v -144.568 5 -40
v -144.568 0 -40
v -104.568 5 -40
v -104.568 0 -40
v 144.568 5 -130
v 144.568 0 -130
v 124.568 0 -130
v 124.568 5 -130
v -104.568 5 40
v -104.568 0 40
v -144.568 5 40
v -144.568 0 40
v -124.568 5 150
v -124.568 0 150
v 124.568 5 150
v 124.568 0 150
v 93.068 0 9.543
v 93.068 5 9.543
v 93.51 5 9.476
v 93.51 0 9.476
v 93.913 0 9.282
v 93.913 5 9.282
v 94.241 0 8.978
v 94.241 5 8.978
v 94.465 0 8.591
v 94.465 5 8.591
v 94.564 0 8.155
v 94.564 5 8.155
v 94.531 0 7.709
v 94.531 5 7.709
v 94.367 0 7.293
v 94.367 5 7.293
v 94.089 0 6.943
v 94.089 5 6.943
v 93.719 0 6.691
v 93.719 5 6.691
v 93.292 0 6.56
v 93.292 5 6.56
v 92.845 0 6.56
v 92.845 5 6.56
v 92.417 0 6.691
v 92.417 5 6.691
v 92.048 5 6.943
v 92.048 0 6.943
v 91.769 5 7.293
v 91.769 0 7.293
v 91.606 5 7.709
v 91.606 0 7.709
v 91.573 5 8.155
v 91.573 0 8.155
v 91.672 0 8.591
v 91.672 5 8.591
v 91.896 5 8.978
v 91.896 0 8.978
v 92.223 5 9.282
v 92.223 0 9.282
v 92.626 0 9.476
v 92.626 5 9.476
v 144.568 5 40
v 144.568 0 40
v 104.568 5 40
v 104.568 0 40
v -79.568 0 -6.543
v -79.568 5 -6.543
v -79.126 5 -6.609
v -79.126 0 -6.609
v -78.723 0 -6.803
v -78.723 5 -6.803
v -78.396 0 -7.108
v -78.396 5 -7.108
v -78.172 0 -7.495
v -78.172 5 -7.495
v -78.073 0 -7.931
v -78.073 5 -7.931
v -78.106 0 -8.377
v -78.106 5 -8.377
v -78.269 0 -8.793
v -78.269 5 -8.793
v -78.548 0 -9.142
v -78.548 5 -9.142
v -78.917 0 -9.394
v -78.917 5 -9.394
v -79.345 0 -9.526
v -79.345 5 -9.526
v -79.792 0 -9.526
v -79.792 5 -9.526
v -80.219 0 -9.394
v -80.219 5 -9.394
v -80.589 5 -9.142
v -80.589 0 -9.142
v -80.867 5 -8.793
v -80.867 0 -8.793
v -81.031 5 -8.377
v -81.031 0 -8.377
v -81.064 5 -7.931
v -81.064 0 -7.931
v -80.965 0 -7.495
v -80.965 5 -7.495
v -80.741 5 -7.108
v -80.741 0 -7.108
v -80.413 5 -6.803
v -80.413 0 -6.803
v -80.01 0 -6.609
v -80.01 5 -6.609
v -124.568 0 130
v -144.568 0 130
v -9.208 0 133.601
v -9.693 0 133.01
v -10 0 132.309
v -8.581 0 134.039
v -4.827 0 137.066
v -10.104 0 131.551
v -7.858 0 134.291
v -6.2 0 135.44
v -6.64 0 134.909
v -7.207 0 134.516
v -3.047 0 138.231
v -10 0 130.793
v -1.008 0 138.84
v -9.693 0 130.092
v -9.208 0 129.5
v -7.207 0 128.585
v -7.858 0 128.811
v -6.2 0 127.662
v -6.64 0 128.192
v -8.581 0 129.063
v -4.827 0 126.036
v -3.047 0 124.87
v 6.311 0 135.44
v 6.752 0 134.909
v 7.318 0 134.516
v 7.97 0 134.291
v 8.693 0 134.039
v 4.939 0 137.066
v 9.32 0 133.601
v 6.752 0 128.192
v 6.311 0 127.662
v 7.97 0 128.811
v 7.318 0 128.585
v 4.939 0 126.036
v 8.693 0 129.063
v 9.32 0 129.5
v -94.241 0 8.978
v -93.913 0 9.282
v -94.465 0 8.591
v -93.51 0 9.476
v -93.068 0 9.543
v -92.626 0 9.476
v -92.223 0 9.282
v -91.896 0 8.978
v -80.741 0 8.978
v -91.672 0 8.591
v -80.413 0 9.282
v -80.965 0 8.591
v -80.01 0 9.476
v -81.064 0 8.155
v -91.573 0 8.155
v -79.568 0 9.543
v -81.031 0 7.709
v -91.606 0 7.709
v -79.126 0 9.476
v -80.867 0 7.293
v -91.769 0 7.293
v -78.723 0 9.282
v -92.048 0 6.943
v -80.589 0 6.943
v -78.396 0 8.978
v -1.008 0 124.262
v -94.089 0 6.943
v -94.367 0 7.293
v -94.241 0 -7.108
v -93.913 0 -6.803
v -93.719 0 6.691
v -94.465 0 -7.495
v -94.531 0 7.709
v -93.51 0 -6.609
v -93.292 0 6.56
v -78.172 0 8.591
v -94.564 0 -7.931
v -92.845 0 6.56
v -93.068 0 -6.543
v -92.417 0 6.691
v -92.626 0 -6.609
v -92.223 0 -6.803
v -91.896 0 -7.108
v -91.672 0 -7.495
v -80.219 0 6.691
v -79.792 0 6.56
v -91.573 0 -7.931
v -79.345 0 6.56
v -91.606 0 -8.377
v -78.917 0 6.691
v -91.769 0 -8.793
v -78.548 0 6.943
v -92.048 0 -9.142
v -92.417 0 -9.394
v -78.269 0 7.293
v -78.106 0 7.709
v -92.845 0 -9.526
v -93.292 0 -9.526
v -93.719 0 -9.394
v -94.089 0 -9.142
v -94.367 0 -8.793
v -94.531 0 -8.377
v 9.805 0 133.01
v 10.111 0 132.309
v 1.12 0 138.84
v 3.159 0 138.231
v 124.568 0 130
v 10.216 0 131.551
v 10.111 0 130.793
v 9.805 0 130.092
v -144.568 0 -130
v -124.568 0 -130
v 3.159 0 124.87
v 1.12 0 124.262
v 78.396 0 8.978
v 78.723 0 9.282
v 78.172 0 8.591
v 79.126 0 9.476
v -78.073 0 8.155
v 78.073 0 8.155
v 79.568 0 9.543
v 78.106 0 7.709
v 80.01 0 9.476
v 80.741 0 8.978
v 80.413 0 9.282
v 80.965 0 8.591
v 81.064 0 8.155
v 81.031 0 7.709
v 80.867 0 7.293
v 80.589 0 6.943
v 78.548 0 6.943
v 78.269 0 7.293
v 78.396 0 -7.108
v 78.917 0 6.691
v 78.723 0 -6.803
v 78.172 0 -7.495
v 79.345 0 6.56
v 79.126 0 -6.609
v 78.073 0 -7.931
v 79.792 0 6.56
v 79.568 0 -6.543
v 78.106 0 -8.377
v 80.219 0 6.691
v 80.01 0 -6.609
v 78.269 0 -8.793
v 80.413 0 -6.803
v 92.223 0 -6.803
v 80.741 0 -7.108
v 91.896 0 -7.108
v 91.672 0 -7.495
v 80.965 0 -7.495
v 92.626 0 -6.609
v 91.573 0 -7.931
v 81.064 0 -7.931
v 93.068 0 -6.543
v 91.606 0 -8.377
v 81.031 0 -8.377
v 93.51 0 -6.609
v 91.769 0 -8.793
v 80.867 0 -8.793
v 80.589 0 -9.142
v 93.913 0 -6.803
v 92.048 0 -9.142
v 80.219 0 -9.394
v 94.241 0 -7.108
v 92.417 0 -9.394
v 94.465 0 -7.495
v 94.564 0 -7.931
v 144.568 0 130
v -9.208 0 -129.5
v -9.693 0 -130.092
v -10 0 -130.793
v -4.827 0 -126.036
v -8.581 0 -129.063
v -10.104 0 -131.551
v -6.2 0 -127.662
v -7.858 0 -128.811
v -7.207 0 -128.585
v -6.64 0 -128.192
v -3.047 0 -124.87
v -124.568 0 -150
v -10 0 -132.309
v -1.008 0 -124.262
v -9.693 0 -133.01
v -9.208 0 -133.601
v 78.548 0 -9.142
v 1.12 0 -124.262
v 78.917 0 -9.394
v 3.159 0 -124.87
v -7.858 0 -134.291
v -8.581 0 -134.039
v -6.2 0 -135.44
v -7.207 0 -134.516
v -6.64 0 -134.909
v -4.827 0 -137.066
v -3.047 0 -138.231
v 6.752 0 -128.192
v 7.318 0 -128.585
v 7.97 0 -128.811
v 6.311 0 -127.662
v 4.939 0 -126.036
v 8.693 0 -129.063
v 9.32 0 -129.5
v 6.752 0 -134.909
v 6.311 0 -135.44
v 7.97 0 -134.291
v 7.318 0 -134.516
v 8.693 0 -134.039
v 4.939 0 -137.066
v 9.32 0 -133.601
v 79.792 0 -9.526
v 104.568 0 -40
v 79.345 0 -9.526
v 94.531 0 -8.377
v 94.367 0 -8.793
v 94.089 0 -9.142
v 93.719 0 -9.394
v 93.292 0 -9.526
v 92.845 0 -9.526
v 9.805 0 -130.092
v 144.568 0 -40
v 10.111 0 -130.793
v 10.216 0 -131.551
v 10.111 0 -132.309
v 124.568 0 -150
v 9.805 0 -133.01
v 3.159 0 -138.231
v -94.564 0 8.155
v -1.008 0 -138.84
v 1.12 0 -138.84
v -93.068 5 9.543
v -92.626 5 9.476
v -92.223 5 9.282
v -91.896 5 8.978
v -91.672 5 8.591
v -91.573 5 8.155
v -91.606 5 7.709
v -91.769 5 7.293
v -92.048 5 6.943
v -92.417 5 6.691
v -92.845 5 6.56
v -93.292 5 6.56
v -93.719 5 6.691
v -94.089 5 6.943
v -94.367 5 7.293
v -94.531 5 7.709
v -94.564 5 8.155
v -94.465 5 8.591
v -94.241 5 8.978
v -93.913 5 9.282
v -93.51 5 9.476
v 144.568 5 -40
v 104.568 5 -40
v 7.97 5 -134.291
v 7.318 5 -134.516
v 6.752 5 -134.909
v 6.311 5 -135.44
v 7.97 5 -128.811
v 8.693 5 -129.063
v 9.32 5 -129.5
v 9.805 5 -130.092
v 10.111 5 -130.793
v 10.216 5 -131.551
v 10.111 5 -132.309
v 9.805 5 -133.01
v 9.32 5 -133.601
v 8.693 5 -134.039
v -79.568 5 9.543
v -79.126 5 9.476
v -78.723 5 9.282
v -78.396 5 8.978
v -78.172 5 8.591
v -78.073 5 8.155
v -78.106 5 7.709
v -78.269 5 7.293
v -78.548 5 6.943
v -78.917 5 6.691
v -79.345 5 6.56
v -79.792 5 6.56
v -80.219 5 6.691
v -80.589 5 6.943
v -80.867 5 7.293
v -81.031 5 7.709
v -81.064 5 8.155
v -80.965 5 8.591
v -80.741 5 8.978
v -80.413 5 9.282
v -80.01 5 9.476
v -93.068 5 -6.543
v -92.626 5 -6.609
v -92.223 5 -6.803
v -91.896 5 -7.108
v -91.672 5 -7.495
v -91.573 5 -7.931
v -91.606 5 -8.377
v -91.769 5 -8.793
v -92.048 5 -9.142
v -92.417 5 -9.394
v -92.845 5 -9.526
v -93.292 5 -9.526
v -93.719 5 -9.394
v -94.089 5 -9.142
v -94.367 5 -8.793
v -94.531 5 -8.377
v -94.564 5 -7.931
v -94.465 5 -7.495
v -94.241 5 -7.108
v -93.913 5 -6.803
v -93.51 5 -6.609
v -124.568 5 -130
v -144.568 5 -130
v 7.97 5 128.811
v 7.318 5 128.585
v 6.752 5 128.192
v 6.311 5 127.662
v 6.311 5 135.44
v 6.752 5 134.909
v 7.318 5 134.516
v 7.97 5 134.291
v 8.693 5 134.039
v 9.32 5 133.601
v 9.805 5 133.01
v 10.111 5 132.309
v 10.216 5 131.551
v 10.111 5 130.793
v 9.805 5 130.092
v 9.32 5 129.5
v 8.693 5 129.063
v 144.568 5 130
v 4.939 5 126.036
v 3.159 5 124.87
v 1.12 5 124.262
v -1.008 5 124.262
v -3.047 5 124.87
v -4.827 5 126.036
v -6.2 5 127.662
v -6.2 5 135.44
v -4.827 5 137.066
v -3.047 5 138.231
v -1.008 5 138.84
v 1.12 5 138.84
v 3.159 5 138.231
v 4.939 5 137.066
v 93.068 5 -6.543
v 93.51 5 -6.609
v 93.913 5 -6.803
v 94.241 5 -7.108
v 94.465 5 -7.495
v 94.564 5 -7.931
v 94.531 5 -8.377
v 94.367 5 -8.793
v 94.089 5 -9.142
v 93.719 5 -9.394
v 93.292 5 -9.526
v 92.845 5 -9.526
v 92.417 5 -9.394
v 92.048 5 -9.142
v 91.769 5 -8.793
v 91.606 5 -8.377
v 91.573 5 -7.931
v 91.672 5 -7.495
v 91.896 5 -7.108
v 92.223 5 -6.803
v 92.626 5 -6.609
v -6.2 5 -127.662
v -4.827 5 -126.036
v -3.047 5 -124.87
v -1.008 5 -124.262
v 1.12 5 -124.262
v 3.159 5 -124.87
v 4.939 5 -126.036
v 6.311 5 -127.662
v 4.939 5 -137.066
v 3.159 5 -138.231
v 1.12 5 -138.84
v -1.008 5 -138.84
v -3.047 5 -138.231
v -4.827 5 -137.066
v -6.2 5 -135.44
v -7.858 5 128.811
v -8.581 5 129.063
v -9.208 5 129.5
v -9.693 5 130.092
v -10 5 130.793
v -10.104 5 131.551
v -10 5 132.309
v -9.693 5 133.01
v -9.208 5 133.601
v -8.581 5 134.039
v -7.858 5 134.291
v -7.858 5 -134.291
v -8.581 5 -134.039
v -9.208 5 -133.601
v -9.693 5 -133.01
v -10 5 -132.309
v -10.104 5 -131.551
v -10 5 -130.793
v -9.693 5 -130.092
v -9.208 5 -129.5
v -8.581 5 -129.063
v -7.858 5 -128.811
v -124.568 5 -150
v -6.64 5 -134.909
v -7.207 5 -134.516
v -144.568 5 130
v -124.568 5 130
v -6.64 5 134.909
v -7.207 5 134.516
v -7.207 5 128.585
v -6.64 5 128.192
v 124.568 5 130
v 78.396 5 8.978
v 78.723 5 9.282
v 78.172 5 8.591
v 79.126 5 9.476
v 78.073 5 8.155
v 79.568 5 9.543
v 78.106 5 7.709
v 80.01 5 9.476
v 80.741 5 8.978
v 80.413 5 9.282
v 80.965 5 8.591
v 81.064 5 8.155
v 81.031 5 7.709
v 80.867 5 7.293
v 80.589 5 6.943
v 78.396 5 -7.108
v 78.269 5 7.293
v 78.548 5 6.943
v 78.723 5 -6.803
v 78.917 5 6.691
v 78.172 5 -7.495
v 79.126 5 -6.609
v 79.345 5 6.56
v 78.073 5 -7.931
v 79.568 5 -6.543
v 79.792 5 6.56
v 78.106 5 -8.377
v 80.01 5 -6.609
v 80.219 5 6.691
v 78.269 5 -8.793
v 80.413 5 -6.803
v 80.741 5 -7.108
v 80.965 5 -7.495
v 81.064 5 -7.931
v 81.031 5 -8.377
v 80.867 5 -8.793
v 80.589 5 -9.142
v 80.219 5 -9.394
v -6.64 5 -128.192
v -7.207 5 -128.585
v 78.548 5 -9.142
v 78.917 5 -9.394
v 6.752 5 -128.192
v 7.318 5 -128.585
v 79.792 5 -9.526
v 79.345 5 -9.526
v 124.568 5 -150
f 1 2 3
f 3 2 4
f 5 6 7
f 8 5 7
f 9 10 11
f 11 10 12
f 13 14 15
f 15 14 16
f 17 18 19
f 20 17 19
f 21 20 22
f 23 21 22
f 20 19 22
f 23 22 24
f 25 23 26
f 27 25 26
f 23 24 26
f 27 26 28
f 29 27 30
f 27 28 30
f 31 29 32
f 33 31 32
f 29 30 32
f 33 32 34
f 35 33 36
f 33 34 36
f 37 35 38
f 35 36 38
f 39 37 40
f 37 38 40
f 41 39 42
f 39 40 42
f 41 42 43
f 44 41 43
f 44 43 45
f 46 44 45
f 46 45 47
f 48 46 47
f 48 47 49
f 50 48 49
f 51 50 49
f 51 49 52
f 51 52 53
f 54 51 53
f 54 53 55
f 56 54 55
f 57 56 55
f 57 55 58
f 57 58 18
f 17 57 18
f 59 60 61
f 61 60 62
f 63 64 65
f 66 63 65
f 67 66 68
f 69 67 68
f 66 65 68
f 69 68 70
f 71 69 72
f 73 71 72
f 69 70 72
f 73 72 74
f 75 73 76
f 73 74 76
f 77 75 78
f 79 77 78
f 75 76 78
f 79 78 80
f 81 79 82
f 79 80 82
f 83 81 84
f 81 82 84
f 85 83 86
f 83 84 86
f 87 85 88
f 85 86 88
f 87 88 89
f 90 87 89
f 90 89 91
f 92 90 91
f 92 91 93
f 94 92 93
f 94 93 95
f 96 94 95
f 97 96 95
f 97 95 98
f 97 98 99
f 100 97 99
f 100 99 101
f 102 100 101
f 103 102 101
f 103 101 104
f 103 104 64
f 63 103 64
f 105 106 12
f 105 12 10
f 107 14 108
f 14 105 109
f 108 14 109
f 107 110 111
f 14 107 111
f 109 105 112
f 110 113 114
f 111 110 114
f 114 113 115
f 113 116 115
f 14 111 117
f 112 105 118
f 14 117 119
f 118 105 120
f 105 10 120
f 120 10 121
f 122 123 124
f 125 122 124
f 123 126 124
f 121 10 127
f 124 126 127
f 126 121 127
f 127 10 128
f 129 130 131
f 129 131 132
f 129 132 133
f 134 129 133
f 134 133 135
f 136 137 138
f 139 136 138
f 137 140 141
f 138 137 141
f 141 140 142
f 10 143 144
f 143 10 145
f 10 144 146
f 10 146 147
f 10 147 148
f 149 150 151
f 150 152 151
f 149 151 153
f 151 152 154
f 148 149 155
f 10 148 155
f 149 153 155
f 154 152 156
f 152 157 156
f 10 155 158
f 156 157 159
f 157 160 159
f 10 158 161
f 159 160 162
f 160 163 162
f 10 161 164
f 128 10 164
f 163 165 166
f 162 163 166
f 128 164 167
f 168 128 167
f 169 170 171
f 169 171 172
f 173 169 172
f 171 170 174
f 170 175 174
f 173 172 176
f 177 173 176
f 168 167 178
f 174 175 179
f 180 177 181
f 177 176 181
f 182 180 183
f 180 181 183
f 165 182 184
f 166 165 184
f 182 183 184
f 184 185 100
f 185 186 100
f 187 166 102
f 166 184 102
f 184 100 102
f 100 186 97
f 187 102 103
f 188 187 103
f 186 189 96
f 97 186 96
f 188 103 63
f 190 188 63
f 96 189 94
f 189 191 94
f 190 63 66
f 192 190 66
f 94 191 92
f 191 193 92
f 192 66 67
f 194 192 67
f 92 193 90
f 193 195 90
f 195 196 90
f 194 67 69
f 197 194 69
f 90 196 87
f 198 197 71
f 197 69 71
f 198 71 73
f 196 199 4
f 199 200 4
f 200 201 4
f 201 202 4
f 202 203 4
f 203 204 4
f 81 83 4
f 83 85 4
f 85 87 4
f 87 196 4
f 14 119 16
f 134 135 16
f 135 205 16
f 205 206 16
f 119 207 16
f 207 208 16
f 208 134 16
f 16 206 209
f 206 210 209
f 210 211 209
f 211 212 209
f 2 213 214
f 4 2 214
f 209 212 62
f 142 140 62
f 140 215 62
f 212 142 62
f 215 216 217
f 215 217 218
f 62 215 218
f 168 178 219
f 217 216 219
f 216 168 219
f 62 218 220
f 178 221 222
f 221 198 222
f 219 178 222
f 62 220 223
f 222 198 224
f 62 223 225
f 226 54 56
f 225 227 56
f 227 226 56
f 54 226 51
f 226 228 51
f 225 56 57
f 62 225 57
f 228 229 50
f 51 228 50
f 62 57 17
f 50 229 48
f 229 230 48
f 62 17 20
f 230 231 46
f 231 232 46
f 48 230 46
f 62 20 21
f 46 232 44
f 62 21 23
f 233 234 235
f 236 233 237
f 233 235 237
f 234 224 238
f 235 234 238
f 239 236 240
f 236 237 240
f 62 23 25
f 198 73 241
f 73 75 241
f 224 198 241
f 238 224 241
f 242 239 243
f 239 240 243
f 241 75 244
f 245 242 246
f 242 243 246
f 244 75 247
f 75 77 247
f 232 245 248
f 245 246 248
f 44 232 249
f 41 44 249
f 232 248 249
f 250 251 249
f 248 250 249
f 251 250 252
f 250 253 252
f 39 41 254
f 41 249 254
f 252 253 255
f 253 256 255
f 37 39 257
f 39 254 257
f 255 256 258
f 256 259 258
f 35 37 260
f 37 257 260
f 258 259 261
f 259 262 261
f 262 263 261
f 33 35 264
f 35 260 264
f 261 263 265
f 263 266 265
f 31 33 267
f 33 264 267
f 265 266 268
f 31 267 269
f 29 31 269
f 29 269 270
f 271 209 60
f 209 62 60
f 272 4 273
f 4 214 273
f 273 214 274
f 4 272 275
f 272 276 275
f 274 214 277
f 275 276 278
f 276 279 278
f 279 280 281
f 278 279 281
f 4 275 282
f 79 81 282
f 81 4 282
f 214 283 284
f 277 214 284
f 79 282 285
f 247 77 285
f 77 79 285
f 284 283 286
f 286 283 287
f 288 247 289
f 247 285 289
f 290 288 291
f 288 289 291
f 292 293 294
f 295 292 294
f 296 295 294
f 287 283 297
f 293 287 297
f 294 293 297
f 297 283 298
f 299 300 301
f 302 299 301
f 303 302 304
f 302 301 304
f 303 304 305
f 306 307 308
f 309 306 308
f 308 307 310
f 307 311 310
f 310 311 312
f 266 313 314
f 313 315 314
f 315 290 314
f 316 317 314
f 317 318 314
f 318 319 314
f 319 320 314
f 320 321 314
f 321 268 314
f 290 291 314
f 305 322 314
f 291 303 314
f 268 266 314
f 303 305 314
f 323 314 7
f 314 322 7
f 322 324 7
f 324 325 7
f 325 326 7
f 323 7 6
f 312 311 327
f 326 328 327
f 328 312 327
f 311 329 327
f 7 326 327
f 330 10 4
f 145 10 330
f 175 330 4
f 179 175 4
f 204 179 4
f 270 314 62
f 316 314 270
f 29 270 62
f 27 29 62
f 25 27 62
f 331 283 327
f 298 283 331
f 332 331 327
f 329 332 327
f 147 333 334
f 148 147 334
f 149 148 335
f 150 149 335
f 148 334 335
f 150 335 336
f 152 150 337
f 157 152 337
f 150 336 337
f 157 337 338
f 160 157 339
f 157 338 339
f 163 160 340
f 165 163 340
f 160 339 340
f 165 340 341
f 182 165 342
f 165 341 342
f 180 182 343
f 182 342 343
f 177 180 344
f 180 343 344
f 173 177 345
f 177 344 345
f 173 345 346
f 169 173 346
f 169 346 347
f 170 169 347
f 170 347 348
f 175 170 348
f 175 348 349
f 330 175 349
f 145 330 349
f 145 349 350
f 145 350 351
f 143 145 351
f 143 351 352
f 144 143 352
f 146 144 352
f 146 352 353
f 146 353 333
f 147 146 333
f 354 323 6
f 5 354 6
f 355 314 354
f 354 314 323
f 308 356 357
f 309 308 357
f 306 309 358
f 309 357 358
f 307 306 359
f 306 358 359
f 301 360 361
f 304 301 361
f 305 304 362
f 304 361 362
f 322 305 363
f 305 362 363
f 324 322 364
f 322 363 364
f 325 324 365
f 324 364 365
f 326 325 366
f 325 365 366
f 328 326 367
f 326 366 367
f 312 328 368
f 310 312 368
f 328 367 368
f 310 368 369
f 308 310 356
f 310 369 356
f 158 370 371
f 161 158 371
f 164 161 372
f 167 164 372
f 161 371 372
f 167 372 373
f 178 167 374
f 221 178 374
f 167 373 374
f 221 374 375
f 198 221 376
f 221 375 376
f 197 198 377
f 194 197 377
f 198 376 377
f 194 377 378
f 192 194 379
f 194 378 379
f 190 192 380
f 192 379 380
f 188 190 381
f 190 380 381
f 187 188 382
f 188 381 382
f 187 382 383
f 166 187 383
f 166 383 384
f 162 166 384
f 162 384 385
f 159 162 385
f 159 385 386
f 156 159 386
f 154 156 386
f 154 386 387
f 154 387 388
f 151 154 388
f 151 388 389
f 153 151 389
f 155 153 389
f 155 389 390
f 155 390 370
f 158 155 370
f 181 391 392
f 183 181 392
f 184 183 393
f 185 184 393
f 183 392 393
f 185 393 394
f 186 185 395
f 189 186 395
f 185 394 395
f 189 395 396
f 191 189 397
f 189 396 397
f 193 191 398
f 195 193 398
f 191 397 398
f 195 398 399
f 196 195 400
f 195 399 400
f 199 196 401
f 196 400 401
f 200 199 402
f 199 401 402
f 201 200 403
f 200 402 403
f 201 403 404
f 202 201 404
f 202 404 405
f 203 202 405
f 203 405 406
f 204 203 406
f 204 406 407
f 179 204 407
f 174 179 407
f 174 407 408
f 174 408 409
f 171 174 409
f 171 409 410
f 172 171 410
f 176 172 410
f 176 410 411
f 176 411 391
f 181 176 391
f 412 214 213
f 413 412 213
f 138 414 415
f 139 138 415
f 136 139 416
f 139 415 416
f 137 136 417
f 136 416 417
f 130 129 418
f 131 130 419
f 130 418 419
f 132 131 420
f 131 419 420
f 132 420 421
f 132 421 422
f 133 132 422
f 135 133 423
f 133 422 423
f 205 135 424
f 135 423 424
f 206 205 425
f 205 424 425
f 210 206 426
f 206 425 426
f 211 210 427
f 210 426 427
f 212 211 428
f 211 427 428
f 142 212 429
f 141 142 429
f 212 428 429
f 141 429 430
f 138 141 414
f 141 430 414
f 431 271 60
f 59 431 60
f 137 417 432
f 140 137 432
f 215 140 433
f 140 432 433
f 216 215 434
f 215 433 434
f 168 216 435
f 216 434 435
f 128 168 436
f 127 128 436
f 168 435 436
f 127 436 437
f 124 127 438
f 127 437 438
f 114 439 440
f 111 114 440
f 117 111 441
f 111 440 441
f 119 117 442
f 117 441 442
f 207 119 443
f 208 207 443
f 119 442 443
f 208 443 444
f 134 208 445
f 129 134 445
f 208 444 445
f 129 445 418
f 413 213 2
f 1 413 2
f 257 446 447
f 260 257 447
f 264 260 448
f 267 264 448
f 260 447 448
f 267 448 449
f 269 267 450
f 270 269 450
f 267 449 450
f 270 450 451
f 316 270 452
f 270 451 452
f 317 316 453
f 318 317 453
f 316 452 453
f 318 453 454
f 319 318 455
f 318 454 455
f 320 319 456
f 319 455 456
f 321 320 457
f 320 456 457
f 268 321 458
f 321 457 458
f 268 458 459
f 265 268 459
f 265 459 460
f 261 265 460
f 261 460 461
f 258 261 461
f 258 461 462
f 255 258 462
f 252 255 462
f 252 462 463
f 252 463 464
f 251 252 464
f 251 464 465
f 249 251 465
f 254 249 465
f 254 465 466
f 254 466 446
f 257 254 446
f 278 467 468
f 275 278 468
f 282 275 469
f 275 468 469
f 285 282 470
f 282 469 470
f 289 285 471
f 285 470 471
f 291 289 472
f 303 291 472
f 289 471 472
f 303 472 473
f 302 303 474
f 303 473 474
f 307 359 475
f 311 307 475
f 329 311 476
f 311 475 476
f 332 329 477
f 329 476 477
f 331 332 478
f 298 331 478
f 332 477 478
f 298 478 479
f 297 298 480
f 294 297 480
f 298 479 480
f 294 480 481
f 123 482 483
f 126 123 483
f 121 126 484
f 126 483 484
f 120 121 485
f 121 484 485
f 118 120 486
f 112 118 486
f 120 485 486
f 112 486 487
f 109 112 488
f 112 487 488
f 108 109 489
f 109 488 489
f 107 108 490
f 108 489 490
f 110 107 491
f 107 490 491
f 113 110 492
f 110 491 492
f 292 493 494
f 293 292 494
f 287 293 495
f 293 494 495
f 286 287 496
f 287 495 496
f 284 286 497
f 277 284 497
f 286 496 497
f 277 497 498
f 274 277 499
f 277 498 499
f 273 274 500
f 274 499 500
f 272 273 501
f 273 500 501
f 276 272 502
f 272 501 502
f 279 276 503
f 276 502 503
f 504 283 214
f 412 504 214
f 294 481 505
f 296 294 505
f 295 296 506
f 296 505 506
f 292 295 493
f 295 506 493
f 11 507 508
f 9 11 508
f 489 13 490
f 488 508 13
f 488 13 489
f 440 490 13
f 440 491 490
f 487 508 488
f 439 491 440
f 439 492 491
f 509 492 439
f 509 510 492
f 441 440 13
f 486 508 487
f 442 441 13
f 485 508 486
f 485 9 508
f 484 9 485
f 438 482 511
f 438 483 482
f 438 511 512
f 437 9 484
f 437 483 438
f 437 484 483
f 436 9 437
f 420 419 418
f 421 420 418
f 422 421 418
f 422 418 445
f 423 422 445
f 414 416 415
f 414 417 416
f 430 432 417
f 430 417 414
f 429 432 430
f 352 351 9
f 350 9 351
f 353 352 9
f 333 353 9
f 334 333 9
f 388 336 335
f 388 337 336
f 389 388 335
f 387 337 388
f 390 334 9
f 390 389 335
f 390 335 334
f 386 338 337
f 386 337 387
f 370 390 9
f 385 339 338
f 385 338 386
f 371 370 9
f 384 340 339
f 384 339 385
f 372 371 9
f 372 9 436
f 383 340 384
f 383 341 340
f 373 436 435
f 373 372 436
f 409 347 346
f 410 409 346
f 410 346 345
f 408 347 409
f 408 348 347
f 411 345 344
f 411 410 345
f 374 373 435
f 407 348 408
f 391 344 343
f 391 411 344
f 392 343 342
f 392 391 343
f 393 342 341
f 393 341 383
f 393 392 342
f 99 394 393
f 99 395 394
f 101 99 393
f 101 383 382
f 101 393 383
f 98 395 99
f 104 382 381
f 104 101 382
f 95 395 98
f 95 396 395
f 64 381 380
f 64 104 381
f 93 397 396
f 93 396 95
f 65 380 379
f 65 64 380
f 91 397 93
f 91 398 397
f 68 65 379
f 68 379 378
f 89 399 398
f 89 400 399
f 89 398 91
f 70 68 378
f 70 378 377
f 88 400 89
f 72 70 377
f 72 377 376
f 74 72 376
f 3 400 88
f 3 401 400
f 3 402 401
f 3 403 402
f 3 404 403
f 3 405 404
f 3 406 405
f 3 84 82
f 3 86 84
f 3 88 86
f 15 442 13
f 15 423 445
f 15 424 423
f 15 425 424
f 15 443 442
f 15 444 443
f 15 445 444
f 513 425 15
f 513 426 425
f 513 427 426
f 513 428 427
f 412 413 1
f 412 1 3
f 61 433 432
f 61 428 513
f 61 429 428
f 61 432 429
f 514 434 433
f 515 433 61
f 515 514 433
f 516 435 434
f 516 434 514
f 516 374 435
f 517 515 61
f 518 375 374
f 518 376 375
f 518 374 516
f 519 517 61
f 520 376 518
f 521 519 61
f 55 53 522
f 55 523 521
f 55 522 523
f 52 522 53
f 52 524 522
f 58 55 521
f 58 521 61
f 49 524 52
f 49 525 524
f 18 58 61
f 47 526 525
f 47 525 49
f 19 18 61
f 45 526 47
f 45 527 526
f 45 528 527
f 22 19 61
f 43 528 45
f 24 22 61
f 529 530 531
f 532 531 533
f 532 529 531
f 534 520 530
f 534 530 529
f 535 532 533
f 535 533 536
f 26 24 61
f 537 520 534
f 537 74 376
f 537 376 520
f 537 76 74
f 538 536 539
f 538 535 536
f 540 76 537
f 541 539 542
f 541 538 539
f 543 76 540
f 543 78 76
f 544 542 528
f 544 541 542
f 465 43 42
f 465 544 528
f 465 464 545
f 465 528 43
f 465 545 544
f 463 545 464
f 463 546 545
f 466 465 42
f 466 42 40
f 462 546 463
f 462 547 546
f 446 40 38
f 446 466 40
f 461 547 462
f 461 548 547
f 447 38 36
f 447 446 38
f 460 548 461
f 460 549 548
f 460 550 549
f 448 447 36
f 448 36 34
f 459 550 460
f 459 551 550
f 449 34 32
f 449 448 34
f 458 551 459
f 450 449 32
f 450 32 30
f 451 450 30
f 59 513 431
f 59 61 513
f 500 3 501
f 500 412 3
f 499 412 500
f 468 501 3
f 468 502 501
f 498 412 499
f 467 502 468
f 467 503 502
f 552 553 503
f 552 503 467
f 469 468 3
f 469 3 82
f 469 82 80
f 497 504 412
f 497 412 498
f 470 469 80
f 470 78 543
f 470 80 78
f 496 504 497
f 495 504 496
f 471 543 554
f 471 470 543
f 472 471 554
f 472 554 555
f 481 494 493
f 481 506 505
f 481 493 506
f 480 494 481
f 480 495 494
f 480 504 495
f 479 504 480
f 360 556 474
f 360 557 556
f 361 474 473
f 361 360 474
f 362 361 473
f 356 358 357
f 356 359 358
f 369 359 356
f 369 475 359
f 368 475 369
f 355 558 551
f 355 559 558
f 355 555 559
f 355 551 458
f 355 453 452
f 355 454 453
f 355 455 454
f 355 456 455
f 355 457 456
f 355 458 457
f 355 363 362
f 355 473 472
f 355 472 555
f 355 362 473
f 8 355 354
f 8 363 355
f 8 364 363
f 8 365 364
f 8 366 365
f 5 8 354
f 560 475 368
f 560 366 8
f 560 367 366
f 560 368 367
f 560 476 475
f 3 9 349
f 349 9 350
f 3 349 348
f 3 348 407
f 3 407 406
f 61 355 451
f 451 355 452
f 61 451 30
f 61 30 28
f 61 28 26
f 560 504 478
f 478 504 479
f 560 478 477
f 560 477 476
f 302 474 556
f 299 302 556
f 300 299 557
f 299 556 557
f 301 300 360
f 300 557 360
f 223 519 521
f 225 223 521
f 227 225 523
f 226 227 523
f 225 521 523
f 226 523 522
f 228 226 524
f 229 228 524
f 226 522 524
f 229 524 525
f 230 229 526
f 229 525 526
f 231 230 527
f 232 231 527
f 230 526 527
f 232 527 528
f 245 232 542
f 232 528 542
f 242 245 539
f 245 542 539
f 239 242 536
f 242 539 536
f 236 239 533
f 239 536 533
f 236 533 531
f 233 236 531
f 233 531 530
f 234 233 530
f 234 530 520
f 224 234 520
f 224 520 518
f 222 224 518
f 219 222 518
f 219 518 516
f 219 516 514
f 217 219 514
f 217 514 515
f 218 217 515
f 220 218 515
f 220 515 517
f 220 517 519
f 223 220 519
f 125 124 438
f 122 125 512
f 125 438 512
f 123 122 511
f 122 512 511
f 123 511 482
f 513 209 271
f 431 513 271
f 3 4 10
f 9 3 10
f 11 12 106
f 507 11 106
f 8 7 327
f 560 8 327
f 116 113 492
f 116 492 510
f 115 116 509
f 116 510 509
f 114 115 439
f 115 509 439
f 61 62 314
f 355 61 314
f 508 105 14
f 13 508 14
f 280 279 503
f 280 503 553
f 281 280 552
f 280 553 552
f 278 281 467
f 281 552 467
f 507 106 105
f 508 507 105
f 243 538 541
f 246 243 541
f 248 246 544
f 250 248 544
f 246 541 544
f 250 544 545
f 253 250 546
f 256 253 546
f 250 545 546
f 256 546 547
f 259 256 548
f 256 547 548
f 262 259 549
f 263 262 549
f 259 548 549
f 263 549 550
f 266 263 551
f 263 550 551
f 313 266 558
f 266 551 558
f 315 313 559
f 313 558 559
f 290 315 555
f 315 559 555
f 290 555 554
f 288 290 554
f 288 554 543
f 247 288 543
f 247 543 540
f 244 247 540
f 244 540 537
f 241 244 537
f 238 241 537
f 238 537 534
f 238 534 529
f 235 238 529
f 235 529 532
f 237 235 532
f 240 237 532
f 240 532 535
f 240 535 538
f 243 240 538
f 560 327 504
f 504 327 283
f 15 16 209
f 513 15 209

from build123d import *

# Parameters (mm, degrees)
BOSS_EXTRU_1_DEPTH      = 5
ESQUISSE2_R             = 1.5
ENL_V_MAT_EXTRU_1_DEPTH = 10


with BuildPart() as part:
    # Esquisse1 → Boss.-Extru.1 (new body)
    with BuildSketch(Plane(origin=(0, 0, 0), x_dir=(1, 0, 0), z_dir=(0, 1, 0))):
        Polygon((-124.568322948, 150), (-124.568322948, 130), (-144.568322948, 130), (-144.568322948, 40), (-104.568322948, 40), (-104.568322948, -40), (-144.568322948, -40), (-144.568322948, -130), (-124.568322948, -130), (-124.568322948, -150), (124.568322948, -150), (124.568322948, -130), (144.568322948, -130), (144.568322948, -40), (104.568322948, -40), (104.568322948, 40), (144.568322948, 40), (144.568322948, 130), (124.568322948, 130), (124.568322948, 150), align=None)
    extrude(amount=BOSS_EXTRU_1_DEPTH)

    # Esquisse2 → Enlèv. mat.-Extru.1 (cut)
    with BuildSketch(Plane(origin=(0, 5, 0), x_dir=(1, 0, 0), z_dir=(0, 1, 0))):
        with Locations(Location((-93.068322948, 8.042853971, 0), (0, 0, 270))):
            Circle(ESQUISSE2_R)
        with Locations(Location((-93.068322948, -8.042853971, 0), (0, 0, 270))):
            Circle(ESQUISSE2_R)
        with Locations(Location((-79.568322948, -8.042853971, 0), (0, 0, 270))):
            Circle(ESQUISSE2_R)
        with Locations(Location((-79.568322948, 8.042853971, 0), (0, 0, 270))):
            Circle(ESQUISSE2_R)
        with Locations(Location((93.068322948, -8.042853971, 0), (0, 0, 270))):
            Circle(ESQUISSE2_R)
        with Locations(Location((79.568322948, -8.042853971, 0), (0, 0, 270))):
            Circle(ESQUISSE2_R)
        with Locations(Location((79.568322948, 8.042853971, 0), (0, 0, 270))):
            Circle(ESQUISSE2_R)
        with Locations(Location((93.068322948, 8.042853971, 0), (0, 0, 270))):
            Circle(ESQUISSE2_R)
        with BuildLine():
            ThreePointArc((7.970010145, -128.811194391), (7.021605285, -128.408236457), (6.3113263, -127.661677259))
            ThreePointArc((6.3113263, -127.661677259), (0.055762197, -124.184876889), (-6.199801905, -127.661677259))
            ThreePointArc((-6.199801905, -127.661677259), (-6.910080891, -128.408236457), (-7.85848575, -128.811194391))
            ThreePointArc((-7.85848575, -128.811194391), (-10.104237803, -131.550876889), (-7.85848575, -134.290559386))
            ThreePointArc((-7.85848575, -134.290559386), (-6.910080891, -134.69351732), (-6.199801905, -135.440076518))
            ThreePointArc((-6.199801905, -135.440076518), (0.055762197, -138.916876889), (6.3113263, -135.440076518))
            ThreePointArc((6.3113263, -135.440076518), (7.021605285, -134.69351732), (7.970010145, -134.290559386))
            ThreePointArc((7.970010145, -134.290559386), (10.215762197, -131.550876889), (7.970010145, -128.811194391))
        make_face()
        with BuildLine():
            ThreePointArc((7.970010145, 128.811194391), (10.215762197, 131.550876889), (7.970010145, 134.290559386))
            ThreePointArc((7.970010145, 134.290559386), (7.021605285, 134.69351732), (6.3113263, 135.440076518))
            ThreePointArc((6.3113263, 135.440076518), (0.055762197, 138.916876889), (-6.199801905, 135.440076518))
            ThreePointArc((-6.199801905, 135.440076518), (-6.910080891, 134.69351732), (-7.85848575, 134.290559386))
            ThreePointArc((-7.85848575, 134.290559386), (-10.104237803, 131.550876889), (-7.85848575, 128.811194391))
            ThreePointArc((-7.85848575, 128.811194391), (-6.910080891, 128.408236457), (-6.199801905, 127.661677259))
            ThreePointArc((-6.199801905, 127.661677259), (0.055762197, 124.184876889), (6.3113263, 127.661677259))
            ThreePointArc((6.3113263, 127.661677259), (7.021605285, 128.408236457), (7.970010145, 128.811194391))
        make_face()
    extrude(amount=-ENL_V_MAT_EXTRU_1_DEPTH, mode=Mode.SUBTRACT)


solid = part.part
